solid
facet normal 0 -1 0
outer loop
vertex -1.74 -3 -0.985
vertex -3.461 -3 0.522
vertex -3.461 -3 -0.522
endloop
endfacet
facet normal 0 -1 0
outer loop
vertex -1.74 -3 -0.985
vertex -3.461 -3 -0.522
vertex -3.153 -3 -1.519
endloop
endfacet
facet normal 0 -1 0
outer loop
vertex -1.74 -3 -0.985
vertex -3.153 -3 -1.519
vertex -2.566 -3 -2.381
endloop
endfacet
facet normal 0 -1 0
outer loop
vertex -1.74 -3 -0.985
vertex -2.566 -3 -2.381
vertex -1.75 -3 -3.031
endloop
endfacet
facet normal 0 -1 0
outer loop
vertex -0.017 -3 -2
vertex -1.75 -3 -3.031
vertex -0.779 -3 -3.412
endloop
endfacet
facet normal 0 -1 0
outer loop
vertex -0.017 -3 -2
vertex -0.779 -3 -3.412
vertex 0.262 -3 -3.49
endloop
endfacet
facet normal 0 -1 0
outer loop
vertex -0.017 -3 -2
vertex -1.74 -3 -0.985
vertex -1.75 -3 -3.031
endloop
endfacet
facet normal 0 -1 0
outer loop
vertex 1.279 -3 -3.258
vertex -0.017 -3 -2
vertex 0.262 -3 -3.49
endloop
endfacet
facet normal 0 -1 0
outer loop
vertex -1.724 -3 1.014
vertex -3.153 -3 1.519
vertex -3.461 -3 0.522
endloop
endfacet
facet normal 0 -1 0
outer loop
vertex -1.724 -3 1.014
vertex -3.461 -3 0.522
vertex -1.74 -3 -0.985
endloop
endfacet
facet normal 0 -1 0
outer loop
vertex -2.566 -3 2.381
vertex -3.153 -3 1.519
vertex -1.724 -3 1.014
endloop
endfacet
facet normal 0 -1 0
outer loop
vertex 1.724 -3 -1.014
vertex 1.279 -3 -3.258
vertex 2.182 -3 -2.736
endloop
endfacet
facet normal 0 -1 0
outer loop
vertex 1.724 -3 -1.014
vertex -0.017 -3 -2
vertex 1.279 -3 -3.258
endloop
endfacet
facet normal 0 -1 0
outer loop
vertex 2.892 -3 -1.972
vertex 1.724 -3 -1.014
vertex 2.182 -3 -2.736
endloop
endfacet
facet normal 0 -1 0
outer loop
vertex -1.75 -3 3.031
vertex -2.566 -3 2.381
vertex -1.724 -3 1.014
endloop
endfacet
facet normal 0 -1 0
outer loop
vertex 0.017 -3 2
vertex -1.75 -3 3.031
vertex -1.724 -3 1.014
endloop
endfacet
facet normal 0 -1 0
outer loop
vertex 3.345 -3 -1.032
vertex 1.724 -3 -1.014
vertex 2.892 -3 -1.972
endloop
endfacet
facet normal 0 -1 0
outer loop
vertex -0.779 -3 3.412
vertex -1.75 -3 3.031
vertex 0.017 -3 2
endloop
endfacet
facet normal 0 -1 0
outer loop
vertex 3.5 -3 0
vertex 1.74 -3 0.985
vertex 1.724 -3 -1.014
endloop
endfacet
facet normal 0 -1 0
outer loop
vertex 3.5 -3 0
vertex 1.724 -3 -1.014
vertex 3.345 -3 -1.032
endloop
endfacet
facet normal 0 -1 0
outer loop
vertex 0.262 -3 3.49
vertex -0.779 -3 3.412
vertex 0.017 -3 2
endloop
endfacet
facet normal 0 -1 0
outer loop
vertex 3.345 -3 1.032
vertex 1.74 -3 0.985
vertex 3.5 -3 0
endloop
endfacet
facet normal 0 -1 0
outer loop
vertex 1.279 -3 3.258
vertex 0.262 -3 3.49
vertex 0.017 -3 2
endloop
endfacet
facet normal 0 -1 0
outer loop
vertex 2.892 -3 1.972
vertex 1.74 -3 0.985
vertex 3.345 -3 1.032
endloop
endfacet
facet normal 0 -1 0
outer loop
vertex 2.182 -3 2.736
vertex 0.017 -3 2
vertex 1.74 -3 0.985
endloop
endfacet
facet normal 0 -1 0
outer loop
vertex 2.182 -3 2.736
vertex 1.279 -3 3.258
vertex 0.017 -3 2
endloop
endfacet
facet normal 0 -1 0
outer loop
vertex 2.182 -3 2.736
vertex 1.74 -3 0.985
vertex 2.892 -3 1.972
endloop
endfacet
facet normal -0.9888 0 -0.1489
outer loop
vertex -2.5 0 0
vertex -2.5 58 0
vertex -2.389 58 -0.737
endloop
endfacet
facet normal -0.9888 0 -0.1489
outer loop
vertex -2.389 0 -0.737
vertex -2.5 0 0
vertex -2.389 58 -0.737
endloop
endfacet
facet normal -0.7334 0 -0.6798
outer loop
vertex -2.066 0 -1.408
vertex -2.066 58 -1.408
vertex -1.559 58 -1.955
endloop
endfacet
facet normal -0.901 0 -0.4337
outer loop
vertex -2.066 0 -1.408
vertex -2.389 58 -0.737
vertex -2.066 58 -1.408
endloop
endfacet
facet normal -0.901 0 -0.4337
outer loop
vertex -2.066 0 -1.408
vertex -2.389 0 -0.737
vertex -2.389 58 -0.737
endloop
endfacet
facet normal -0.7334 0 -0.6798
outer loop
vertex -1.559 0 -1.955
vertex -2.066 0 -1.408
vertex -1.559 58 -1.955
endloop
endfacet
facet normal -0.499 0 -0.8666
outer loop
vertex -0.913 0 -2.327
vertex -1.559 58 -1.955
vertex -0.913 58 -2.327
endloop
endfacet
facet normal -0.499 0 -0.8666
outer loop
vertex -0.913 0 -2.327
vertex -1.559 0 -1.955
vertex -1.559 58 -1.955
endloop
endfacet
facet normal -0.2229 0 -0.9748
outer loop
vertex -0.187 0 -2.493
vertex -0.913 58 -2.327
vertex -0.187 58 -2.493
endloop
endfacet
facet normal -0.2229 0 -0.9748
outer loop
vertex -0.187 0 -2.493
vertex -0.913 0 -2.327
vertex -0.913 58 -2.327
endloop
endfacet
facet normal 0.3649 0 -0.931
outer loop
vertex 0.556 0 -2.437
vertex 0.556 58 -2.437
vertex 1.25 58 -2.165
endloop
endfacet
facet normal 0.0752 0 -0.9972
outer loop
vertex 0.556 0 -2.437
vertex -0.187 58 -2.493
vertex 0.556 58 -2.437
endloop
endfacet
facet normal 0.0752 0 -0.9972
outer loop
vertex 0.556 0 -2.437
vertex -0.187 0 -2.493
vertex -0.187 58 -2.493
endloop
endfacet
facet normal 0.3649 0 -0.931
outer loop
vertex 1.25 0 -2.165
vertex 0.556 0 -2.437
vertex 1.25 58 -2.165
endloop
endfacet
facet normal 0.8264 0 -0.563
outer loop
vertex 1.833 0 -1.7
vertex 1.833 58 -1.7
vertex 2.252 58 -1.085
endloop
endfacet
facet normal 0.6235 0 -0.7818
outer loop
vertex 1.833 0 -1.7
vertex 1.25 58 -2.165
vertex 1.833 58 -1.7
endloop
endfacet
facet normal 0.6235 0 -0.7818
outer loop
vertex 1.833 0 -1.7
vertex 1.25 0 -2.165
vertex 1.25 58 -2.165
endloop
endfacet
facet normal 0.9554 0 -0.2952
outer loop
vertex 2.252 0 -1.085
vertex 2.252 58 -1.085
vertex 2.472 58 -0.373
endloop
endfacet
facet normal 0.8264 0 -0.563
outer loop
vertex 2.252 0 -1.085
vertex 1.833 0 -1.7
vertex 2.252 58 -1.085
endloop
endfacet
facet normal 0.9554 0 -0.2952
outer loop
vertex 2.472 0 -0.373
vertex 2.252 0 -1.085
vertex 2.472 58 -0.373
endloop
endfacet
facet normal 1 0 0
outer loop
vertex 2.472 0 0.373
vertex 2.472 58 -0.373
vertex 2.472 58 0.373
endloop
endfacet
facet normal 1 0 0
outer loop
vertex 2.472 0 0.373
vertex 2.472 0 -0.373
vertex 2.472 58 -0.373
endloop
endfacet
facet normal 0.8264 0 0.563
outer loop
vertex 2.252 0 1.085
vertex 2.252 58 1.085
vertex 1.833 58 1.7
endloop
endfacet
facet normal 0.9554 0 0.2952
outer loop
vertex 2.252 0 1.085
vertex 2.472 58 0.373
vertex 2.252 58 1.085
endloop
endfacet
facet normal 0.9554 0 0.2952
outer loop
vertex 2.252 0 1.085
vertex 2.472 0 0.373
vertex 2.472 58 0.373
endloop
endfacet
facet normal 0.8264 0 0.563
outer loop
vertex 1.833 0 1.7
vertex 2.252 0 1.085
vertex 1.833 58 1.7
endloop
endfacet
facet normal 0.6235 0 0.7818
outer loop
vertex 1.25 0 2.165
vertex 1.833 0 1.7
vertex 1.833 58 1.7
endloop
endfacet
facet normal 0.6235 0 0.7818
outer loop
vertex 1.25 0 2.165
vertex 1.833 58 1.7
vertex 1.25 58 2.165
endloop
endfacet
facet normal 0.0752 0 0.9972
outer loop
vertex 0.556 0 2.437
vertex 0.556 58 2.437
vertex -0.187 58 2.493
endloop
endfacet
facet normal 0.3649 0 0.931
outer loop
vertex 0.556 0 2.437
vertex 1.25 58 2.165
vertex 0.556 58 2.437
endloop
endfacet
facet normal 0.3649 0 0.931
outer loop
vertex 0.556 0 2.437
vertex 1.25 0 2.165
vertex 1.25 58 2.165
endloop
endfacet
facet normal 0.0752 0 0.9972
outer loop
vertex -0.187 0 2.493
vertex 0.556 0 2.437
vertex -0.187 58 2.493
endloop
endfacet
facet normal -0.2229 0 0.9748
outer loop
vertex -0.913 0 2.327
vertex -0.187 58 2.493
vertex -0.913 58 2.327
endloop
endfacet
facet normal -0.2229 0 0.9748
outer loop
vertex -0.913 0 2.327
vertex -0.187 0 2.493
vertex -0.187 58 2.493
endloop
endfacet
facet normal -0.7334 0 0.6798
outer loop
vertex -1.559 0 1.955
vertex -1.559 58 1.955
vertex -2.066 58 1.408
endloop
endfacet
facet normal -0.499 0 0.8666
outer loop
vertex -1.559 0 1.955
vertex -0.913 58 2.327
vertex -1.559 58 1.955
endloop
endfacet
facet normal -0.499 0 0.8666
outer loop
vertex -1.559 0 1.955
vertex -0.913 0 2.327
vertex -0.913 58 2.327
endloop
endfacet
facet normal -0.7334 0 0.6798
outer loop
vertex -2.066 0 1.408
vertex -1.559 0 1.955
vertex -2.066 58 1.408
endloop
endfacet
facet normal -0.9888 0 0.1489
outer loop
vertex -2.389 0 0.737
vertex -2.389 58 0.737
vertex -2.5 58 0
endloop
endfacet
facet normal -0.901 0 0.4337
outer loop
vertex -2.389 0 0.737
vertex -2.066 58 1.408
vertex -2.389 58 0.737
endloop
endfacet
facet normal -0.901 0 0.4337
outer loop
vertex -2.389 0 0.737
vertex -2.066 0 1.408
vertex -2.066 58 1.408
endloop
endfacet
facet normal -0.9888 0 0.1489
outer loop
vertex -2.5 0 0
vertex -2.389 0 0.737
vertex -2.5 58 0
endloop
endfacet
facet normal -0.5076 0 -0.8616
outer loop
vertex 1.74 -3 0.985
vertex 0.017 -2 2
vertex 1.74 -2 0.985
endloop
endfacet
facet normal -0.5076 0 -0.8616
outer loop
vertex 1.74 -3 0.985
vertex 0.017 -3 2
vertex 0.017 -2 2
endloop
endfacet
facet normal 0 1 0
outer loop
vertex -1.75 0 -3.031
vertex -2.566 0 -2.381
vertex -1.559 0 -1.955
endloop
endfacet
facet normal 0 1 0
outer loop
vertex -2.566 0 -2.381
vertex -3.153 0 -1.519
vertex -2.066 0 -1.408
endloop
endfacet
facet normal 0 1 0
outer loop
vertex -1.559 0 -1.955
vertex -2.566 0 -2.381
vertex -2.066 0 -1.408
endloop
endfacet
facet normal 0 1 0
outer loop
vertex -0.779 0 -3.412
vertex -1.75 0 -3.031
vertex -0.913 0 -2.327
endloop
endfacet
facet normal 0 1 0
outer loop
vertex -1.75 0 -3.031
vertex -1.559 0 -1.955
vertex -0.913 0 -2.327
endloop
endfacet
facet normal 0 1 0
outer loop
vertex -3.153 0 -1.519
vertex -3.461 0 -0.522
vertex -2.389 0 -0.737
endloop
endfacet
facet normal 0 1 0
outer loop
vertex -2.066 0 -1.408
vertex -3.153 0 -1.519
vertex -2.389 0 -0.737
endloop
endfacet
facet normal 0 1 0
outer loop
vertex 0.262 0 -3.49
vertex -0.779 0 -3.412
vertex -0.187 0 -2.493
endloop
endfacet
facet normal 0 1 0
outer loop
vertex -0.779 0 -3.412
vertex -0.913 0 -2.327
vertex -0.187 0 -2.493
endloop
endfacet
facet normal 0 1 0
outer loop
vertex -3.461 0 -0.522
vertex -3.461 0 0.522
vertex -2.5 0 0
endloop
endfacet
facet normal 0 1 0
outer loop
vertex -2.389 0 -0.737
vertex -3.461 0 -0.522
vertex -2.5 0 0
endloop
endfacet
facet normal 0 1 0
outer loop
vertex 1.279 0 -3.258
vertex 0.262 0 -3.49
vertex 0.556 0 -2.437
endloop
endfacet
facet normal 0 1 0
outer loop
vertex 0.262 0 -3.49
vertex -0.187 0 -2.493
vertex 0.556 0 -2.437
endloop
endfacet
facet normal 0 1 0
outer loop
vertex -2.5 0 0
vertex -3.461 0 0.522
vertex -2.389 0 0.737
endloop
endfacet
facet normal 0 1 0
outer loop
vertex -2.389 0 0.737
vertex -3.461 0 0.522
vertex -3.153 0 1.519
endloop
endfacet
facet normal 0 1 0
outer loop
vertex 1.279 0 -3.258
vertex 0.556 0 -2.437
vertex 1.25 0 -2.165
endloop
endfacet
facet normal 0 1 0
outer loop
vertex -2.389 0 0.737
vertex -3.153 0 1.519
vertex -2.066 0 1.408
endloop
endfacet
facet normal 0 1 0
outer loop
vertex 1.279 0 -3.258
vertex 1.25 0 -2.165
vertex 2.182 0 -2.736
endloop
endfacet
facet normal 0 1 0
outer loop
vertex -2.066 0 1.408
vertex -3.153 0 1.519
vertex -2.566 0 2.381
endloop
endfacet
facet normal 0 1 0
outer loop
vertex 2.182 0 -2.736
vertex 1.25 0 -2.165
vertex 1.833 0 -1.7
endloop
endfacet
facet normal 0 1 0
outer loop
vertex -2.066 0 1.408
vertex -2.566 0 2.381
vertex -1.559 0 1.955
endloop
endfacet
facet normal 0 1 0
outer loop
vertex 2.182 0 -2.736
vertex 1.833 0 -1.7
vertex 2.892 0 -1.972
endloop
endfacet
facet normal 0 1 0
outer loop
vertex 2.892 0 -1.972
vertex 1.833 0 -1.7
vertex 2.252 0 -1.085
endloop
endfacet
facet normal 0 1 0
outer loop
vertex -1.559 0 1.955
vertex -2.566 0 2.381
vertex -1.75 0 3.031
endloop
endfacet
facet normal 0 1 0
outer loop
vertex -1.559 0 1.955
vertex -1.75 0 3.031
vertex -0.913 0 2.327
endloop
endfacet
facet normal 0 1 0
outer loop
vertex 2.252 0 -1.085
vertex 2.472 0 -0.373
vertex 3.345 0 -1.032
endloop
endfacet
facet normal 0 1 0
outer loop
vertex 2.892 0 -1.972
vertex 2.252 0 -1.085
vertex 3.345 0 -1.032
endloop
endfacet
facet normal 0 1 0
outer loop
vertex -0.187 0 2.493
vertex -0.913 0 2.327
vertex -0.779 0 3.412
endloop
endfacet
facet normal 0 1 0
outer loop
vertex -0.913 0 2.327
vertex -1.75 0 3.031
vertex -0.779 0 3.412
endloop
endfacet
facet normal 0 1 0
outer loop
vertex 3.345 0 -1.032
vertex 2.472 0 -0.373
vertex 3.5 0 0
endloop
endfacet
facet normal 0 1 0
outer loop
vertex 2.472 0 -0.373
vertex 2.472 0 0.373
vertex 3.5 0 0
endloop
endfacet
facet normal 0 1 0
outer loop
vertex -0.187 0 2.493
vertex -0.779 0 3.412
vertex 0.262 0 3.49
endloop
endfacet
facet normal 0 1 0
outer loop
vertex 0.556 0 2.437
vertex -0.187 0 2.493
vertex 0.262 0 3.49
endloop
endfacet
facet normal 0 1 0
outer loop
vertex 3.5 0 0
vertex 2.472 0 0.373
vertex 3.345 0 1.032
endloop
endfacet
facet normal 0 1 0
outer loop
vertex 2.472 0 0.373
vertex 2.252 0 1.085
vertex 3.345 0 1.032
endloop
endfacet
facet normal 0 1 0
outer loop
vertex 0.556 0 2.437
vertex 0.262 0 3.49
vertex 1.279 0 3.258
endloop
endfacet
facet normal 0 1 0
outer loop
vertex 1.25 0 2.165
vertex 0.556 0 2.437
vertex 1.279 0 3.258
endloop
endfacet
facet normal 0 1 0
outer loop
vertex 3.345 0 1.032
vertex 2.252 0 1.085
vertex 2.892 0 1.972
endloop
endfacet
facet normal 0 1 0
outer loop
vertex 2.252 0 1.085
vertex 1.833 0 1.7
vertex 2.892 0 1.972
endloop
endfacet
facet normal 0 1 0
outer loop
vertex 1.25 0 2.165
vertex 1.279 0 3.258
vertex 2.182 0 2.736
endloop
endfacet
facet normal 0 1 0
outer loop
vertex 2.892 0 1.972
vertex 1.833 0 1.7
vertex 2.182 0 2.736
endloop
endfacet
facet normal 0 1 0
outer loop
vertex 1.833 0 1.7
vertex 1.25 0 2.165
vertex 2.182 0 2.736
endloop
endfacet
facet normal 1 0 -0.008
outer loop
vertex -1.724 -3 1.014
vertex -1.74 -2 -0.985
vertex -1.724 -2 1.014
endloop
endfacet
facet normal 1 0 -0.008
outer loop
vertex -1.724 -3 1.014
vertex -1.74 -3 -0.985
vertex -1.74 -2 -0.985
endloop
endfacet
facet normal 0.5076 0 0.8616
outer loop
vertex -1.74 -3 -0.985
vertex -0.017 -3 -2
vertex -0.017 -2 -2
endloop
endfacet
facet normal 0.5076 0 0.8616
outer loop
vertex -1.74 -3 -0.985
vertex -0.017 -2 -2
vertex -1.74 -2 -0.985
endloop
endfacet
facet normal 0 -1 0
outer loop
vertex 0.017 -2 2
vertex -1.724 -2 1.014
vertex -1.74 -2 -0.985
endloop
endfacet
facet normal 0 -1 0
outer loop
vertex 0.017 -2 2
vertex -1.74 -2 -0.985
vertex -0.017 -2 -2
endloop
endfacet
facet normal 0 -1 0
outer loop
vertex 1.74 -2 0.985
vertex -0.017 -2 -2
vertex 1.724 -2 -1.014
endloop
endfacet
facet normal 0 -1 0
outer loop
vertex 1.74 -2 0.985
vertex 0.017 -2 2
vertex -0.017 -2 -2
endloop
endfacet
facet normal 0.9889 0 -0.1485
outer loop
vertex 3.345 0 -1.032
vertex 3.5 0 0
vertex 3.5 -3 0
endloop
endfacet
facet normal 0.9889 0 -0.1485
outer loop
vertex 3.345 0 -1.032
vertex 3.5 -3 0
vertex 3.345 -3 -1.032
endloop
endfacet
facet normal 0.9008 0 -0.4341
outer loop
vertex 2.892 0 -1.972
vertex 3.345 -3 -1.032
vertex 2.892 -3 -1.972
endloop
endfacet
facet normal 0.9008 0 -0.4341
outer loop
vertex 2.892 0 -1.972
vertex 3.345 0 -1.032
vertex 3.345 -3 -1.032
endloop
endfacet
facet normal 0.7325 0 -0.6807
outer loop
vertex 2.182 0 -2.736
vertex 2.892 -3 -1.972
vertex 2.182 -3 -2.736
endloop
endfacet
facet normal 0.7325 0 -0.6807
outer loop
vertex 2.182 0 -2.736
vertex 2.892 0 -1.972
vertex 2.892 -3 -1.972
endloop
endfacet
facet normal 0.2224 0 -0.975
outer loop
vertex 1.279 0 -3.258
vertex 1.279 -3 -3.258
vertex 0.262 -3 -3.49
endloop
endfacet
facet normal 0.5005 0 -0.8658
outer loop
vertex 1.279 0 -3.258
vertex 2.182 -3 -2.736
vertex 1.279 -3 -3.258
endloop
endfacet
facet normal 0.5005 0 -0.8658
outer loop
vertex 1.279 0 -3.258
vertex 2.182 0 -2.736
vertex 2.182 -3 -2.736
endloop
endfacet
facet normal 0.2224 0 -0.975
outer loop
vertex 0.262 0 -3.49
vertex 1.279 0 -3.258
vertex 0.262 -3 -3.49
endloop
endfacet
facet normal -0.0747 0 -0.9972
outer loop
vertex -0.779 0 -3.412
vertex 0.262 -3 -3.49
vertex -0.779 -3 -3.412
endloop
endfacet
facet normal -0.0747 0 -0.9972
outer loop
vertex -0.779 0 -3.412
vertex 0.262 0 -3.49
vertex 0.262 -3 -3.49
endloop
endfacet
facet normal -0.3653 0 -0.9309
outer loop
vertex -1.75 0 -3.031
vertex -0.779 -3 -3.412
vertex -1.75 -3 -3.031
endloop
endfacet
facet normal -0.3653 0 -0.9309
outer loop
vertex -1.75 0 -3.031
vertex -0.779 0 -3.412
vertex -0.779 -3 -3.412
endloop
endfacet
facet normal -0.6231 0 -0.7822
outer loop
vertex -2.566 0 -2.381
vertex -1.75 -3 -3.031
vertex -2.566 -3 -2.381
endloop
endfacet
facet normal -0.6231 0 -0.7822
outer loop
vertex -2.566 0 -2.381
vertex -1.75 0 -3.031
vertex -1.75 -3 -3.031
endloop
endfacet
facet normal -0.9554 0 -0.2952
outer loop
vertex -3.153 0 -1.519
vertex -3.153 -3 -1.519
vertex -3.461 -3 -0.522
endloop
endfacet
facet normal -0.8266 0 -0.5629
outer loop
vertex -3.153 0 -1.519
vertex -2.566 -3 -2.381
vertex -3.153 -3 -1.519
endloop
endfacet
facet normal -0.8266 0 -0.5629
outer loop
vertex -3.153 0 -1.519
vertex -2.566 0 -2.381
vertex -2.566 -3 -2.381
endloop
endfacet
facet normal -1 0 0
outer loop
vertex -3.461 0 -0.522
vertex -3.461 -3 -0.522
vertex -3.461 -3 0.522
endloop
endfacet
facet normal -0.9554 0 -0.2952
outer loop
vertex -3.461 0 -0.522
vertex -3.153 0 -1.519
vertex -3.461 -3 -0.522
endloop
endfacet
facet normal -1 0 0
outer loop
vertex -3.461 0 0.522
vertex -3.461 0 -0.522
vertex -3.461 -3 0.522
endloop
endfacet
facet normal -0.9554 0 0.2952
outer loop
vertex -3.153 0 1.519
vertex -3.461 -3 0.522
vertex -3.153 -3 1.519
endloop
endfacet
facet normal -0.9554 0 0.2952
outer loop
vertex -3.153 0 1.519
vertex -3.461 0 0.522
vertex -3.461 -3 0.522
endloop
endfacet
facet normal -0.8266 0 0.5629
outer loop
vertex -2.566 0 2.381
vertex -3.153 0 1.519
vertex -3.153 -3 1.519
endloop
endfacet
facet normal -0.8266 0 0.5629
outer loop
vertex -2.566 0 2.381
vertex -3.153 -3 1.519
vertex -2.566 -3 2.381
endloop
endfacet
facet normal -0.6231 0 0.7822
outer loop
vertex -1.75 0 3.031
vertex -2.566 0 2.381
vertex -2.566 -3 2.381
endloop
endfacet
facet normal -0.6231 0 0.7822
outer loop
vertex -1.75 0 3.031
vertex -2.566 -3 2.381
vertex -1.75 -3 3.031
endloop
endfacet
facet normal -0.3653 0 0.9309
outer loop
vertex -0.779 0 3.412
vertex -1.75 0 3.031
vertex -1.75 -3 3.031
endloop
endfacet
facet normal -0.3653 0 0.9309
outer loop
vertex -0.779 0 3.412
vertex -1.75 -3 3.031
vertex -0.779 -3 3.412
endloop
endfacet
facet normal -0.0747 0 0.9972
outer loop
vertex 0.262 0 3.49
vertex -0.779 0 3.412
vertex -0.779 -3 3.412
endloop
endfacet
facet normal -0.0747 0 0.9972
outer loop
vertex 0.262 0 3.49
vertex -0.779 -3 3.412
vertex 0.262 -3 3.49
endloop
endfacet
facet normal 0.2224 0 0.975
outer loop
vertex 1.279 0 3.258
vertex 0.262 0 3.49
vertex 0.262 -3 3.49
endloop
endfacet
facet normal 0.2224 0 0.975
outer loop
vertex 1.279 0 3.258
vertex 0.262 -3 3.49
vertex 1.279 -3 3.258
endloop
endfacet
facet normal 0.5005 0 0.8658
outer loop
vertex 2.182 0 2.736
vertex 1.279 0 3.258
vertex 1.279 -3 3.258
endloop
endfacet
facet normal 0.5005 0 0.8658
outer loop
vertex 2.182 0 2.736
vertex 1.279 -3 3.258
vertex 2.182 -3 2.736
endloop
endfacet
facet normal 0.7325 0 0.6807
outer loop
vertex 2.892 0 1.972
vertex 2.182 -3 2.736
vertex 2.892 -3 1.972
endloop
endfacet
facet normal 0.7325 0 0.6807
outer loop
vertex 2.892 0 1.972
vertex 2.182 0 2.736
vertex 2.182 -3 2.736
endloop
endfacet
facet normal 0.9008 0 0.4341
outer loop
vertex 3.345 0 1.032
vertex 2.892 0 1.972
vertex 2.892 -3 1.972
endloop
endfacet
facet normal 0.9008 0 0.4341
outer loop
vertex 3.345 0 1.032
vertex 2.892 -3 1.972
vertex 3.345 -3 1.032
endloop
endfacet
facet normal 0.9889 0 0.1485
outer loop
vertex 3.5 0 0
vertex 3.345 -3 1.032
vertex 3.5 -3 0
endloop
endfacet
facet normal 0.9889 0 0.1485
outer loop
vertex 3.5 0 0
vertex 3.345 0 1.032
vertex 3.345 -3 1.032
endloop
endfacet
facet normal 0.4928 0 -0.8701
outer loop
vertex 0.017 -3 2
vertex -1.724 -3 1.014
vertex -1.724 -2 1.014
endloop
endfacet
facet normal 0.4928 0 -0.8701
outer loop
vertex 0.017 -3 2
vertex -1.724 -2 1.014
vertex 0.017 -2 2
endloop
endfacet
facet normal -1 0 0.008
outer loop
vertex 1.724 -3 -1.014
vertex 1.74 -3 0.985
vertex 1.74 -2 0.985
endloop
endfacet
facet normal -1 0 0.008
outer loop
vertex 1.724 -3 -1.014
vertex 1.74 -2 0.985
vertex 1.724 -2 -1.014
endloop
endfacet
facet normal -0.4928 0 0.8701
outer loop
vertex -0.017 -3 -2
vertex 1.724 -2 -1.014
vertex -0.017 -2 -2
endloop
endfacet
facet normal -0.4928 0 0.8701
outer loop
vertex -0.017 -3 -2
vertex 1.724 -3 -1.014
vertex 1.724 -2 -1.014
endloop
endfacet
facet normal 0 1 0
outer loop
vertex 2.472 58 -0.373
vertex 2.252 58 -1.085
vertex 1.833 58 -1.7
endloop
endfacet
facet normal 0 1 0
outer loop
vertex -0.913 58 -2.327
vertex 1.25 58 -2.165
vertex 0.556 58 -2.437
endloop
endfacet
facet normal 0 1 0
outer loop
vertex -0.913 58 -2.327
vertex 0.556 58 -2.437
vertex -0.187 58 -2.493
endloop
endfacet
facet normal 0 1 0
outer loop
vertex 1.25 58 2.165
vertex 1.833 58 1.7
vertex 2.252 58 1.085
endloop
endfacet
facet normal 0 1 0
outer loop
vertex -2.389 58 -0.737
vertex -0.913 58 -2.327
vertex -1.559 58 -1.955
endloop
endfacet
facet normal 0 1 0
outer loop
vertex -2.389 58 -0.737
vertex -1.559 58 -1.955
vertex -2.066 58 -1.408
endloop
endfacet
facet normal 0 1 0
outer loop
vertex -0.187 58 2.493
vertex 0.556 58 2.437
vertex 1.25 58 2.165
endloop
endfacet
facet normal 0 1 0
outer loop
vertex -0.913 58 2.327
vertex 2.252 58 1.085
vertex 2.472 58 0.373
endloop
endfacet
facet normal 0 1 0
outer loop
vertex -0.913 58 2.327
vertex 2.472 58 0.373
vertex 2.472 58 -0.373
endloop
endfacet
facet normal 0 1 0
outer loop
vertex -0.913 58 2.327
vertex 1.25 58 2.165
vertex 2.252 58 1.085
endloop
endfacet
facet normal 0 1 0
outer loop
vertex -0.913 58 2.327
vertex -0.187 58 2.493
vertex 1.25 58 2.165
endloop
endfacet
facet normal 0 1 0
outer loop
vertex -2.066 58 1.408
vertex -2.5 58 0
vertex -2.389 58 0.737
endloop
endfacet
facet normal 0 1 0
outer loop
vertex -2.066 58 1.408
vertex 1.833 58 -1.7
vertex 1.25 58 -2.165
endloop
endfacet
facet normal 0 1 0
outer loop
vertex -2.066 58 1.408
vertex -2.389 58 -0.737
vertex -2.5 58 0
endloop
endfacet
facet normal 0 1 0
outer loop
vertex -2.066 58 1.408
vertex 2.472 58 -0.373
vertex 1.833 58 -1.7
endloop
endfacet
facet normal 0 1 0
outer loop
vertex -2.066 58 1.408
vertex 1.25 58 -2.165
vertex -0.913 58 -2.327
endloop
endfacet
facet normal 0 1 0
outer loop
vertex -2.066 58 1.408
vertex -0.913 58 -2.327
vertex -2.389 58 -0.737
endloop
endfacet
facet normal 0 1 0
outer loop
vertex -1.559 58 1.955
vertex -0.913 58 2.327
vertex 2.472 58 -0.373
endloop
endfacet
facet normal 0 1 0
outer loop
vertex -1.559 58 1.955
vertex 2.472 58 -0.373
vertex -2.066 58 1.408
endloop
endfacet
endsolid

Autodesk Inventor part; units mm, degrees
ref_plane "YZ Plane" through (0, 0, 0) normal (1, 0, 0) x (0, 1, 0)
ref_plane "XZ Plane" through (0, 0, 0) normal (0, 1, 0) x (-1, 0, 0)
ref_plane "XY Plane" through (0, 0, 0) normal (0, 0, 1) x (1, 0, 0)
sketch "Sketch1" plane through (0, 0, 0) normal (0, 1, 0) x (-1, 0, 0)
  circle A0 centre (0, 0) radius 2.5
  dimension "d0" = 5
extrude "Extrusion1" add sketch "Sketch1" along normal blind 58
sketch "Sketch2" plane through (0, 0, 0) normal (0, -1, 0) x (1, 0, 0)
  circle A0 centre (0, 0) radius 3.5
  dimension "d3" = 7
extrude "Extrusion2" add sketch "Sketch2" along normal blind 3
thread "Thread1" size "M5x0.8" class "6g" standard "ANSI Metric M Profile" length 7.5
sketch "Sketch3" plane through (0, -3, 0) normal (0, -1, 0) x (1, 0, 0)
  circle A0 centre (0, 0) radius 2.5 projected
  line L0 (1.7236, -1.0145) -> (-0.0168, -1.9999)
  line L1 (-0.0168, -1.9999) -> (-1.7404, -0.9854)
  line L2 (-1.7404, -0.9854) -> (-1.7236, 1.0145)
  line L3 (-1.7236, 1.0145) -> (0.0168, 1.9999)
  line L4 (0.0168, 1.9999) -> (1.7404, 0.9854)
  line L5 (1.7404, 0.9854) -> (1.7236, -1.0145)
extrude "Extrusion3" cut sketch "Sketch3" against normal blind 1 contours L0 L1 L2 L3 L4 L5
properties part number "Connector_1" material "Steel, Mild"
